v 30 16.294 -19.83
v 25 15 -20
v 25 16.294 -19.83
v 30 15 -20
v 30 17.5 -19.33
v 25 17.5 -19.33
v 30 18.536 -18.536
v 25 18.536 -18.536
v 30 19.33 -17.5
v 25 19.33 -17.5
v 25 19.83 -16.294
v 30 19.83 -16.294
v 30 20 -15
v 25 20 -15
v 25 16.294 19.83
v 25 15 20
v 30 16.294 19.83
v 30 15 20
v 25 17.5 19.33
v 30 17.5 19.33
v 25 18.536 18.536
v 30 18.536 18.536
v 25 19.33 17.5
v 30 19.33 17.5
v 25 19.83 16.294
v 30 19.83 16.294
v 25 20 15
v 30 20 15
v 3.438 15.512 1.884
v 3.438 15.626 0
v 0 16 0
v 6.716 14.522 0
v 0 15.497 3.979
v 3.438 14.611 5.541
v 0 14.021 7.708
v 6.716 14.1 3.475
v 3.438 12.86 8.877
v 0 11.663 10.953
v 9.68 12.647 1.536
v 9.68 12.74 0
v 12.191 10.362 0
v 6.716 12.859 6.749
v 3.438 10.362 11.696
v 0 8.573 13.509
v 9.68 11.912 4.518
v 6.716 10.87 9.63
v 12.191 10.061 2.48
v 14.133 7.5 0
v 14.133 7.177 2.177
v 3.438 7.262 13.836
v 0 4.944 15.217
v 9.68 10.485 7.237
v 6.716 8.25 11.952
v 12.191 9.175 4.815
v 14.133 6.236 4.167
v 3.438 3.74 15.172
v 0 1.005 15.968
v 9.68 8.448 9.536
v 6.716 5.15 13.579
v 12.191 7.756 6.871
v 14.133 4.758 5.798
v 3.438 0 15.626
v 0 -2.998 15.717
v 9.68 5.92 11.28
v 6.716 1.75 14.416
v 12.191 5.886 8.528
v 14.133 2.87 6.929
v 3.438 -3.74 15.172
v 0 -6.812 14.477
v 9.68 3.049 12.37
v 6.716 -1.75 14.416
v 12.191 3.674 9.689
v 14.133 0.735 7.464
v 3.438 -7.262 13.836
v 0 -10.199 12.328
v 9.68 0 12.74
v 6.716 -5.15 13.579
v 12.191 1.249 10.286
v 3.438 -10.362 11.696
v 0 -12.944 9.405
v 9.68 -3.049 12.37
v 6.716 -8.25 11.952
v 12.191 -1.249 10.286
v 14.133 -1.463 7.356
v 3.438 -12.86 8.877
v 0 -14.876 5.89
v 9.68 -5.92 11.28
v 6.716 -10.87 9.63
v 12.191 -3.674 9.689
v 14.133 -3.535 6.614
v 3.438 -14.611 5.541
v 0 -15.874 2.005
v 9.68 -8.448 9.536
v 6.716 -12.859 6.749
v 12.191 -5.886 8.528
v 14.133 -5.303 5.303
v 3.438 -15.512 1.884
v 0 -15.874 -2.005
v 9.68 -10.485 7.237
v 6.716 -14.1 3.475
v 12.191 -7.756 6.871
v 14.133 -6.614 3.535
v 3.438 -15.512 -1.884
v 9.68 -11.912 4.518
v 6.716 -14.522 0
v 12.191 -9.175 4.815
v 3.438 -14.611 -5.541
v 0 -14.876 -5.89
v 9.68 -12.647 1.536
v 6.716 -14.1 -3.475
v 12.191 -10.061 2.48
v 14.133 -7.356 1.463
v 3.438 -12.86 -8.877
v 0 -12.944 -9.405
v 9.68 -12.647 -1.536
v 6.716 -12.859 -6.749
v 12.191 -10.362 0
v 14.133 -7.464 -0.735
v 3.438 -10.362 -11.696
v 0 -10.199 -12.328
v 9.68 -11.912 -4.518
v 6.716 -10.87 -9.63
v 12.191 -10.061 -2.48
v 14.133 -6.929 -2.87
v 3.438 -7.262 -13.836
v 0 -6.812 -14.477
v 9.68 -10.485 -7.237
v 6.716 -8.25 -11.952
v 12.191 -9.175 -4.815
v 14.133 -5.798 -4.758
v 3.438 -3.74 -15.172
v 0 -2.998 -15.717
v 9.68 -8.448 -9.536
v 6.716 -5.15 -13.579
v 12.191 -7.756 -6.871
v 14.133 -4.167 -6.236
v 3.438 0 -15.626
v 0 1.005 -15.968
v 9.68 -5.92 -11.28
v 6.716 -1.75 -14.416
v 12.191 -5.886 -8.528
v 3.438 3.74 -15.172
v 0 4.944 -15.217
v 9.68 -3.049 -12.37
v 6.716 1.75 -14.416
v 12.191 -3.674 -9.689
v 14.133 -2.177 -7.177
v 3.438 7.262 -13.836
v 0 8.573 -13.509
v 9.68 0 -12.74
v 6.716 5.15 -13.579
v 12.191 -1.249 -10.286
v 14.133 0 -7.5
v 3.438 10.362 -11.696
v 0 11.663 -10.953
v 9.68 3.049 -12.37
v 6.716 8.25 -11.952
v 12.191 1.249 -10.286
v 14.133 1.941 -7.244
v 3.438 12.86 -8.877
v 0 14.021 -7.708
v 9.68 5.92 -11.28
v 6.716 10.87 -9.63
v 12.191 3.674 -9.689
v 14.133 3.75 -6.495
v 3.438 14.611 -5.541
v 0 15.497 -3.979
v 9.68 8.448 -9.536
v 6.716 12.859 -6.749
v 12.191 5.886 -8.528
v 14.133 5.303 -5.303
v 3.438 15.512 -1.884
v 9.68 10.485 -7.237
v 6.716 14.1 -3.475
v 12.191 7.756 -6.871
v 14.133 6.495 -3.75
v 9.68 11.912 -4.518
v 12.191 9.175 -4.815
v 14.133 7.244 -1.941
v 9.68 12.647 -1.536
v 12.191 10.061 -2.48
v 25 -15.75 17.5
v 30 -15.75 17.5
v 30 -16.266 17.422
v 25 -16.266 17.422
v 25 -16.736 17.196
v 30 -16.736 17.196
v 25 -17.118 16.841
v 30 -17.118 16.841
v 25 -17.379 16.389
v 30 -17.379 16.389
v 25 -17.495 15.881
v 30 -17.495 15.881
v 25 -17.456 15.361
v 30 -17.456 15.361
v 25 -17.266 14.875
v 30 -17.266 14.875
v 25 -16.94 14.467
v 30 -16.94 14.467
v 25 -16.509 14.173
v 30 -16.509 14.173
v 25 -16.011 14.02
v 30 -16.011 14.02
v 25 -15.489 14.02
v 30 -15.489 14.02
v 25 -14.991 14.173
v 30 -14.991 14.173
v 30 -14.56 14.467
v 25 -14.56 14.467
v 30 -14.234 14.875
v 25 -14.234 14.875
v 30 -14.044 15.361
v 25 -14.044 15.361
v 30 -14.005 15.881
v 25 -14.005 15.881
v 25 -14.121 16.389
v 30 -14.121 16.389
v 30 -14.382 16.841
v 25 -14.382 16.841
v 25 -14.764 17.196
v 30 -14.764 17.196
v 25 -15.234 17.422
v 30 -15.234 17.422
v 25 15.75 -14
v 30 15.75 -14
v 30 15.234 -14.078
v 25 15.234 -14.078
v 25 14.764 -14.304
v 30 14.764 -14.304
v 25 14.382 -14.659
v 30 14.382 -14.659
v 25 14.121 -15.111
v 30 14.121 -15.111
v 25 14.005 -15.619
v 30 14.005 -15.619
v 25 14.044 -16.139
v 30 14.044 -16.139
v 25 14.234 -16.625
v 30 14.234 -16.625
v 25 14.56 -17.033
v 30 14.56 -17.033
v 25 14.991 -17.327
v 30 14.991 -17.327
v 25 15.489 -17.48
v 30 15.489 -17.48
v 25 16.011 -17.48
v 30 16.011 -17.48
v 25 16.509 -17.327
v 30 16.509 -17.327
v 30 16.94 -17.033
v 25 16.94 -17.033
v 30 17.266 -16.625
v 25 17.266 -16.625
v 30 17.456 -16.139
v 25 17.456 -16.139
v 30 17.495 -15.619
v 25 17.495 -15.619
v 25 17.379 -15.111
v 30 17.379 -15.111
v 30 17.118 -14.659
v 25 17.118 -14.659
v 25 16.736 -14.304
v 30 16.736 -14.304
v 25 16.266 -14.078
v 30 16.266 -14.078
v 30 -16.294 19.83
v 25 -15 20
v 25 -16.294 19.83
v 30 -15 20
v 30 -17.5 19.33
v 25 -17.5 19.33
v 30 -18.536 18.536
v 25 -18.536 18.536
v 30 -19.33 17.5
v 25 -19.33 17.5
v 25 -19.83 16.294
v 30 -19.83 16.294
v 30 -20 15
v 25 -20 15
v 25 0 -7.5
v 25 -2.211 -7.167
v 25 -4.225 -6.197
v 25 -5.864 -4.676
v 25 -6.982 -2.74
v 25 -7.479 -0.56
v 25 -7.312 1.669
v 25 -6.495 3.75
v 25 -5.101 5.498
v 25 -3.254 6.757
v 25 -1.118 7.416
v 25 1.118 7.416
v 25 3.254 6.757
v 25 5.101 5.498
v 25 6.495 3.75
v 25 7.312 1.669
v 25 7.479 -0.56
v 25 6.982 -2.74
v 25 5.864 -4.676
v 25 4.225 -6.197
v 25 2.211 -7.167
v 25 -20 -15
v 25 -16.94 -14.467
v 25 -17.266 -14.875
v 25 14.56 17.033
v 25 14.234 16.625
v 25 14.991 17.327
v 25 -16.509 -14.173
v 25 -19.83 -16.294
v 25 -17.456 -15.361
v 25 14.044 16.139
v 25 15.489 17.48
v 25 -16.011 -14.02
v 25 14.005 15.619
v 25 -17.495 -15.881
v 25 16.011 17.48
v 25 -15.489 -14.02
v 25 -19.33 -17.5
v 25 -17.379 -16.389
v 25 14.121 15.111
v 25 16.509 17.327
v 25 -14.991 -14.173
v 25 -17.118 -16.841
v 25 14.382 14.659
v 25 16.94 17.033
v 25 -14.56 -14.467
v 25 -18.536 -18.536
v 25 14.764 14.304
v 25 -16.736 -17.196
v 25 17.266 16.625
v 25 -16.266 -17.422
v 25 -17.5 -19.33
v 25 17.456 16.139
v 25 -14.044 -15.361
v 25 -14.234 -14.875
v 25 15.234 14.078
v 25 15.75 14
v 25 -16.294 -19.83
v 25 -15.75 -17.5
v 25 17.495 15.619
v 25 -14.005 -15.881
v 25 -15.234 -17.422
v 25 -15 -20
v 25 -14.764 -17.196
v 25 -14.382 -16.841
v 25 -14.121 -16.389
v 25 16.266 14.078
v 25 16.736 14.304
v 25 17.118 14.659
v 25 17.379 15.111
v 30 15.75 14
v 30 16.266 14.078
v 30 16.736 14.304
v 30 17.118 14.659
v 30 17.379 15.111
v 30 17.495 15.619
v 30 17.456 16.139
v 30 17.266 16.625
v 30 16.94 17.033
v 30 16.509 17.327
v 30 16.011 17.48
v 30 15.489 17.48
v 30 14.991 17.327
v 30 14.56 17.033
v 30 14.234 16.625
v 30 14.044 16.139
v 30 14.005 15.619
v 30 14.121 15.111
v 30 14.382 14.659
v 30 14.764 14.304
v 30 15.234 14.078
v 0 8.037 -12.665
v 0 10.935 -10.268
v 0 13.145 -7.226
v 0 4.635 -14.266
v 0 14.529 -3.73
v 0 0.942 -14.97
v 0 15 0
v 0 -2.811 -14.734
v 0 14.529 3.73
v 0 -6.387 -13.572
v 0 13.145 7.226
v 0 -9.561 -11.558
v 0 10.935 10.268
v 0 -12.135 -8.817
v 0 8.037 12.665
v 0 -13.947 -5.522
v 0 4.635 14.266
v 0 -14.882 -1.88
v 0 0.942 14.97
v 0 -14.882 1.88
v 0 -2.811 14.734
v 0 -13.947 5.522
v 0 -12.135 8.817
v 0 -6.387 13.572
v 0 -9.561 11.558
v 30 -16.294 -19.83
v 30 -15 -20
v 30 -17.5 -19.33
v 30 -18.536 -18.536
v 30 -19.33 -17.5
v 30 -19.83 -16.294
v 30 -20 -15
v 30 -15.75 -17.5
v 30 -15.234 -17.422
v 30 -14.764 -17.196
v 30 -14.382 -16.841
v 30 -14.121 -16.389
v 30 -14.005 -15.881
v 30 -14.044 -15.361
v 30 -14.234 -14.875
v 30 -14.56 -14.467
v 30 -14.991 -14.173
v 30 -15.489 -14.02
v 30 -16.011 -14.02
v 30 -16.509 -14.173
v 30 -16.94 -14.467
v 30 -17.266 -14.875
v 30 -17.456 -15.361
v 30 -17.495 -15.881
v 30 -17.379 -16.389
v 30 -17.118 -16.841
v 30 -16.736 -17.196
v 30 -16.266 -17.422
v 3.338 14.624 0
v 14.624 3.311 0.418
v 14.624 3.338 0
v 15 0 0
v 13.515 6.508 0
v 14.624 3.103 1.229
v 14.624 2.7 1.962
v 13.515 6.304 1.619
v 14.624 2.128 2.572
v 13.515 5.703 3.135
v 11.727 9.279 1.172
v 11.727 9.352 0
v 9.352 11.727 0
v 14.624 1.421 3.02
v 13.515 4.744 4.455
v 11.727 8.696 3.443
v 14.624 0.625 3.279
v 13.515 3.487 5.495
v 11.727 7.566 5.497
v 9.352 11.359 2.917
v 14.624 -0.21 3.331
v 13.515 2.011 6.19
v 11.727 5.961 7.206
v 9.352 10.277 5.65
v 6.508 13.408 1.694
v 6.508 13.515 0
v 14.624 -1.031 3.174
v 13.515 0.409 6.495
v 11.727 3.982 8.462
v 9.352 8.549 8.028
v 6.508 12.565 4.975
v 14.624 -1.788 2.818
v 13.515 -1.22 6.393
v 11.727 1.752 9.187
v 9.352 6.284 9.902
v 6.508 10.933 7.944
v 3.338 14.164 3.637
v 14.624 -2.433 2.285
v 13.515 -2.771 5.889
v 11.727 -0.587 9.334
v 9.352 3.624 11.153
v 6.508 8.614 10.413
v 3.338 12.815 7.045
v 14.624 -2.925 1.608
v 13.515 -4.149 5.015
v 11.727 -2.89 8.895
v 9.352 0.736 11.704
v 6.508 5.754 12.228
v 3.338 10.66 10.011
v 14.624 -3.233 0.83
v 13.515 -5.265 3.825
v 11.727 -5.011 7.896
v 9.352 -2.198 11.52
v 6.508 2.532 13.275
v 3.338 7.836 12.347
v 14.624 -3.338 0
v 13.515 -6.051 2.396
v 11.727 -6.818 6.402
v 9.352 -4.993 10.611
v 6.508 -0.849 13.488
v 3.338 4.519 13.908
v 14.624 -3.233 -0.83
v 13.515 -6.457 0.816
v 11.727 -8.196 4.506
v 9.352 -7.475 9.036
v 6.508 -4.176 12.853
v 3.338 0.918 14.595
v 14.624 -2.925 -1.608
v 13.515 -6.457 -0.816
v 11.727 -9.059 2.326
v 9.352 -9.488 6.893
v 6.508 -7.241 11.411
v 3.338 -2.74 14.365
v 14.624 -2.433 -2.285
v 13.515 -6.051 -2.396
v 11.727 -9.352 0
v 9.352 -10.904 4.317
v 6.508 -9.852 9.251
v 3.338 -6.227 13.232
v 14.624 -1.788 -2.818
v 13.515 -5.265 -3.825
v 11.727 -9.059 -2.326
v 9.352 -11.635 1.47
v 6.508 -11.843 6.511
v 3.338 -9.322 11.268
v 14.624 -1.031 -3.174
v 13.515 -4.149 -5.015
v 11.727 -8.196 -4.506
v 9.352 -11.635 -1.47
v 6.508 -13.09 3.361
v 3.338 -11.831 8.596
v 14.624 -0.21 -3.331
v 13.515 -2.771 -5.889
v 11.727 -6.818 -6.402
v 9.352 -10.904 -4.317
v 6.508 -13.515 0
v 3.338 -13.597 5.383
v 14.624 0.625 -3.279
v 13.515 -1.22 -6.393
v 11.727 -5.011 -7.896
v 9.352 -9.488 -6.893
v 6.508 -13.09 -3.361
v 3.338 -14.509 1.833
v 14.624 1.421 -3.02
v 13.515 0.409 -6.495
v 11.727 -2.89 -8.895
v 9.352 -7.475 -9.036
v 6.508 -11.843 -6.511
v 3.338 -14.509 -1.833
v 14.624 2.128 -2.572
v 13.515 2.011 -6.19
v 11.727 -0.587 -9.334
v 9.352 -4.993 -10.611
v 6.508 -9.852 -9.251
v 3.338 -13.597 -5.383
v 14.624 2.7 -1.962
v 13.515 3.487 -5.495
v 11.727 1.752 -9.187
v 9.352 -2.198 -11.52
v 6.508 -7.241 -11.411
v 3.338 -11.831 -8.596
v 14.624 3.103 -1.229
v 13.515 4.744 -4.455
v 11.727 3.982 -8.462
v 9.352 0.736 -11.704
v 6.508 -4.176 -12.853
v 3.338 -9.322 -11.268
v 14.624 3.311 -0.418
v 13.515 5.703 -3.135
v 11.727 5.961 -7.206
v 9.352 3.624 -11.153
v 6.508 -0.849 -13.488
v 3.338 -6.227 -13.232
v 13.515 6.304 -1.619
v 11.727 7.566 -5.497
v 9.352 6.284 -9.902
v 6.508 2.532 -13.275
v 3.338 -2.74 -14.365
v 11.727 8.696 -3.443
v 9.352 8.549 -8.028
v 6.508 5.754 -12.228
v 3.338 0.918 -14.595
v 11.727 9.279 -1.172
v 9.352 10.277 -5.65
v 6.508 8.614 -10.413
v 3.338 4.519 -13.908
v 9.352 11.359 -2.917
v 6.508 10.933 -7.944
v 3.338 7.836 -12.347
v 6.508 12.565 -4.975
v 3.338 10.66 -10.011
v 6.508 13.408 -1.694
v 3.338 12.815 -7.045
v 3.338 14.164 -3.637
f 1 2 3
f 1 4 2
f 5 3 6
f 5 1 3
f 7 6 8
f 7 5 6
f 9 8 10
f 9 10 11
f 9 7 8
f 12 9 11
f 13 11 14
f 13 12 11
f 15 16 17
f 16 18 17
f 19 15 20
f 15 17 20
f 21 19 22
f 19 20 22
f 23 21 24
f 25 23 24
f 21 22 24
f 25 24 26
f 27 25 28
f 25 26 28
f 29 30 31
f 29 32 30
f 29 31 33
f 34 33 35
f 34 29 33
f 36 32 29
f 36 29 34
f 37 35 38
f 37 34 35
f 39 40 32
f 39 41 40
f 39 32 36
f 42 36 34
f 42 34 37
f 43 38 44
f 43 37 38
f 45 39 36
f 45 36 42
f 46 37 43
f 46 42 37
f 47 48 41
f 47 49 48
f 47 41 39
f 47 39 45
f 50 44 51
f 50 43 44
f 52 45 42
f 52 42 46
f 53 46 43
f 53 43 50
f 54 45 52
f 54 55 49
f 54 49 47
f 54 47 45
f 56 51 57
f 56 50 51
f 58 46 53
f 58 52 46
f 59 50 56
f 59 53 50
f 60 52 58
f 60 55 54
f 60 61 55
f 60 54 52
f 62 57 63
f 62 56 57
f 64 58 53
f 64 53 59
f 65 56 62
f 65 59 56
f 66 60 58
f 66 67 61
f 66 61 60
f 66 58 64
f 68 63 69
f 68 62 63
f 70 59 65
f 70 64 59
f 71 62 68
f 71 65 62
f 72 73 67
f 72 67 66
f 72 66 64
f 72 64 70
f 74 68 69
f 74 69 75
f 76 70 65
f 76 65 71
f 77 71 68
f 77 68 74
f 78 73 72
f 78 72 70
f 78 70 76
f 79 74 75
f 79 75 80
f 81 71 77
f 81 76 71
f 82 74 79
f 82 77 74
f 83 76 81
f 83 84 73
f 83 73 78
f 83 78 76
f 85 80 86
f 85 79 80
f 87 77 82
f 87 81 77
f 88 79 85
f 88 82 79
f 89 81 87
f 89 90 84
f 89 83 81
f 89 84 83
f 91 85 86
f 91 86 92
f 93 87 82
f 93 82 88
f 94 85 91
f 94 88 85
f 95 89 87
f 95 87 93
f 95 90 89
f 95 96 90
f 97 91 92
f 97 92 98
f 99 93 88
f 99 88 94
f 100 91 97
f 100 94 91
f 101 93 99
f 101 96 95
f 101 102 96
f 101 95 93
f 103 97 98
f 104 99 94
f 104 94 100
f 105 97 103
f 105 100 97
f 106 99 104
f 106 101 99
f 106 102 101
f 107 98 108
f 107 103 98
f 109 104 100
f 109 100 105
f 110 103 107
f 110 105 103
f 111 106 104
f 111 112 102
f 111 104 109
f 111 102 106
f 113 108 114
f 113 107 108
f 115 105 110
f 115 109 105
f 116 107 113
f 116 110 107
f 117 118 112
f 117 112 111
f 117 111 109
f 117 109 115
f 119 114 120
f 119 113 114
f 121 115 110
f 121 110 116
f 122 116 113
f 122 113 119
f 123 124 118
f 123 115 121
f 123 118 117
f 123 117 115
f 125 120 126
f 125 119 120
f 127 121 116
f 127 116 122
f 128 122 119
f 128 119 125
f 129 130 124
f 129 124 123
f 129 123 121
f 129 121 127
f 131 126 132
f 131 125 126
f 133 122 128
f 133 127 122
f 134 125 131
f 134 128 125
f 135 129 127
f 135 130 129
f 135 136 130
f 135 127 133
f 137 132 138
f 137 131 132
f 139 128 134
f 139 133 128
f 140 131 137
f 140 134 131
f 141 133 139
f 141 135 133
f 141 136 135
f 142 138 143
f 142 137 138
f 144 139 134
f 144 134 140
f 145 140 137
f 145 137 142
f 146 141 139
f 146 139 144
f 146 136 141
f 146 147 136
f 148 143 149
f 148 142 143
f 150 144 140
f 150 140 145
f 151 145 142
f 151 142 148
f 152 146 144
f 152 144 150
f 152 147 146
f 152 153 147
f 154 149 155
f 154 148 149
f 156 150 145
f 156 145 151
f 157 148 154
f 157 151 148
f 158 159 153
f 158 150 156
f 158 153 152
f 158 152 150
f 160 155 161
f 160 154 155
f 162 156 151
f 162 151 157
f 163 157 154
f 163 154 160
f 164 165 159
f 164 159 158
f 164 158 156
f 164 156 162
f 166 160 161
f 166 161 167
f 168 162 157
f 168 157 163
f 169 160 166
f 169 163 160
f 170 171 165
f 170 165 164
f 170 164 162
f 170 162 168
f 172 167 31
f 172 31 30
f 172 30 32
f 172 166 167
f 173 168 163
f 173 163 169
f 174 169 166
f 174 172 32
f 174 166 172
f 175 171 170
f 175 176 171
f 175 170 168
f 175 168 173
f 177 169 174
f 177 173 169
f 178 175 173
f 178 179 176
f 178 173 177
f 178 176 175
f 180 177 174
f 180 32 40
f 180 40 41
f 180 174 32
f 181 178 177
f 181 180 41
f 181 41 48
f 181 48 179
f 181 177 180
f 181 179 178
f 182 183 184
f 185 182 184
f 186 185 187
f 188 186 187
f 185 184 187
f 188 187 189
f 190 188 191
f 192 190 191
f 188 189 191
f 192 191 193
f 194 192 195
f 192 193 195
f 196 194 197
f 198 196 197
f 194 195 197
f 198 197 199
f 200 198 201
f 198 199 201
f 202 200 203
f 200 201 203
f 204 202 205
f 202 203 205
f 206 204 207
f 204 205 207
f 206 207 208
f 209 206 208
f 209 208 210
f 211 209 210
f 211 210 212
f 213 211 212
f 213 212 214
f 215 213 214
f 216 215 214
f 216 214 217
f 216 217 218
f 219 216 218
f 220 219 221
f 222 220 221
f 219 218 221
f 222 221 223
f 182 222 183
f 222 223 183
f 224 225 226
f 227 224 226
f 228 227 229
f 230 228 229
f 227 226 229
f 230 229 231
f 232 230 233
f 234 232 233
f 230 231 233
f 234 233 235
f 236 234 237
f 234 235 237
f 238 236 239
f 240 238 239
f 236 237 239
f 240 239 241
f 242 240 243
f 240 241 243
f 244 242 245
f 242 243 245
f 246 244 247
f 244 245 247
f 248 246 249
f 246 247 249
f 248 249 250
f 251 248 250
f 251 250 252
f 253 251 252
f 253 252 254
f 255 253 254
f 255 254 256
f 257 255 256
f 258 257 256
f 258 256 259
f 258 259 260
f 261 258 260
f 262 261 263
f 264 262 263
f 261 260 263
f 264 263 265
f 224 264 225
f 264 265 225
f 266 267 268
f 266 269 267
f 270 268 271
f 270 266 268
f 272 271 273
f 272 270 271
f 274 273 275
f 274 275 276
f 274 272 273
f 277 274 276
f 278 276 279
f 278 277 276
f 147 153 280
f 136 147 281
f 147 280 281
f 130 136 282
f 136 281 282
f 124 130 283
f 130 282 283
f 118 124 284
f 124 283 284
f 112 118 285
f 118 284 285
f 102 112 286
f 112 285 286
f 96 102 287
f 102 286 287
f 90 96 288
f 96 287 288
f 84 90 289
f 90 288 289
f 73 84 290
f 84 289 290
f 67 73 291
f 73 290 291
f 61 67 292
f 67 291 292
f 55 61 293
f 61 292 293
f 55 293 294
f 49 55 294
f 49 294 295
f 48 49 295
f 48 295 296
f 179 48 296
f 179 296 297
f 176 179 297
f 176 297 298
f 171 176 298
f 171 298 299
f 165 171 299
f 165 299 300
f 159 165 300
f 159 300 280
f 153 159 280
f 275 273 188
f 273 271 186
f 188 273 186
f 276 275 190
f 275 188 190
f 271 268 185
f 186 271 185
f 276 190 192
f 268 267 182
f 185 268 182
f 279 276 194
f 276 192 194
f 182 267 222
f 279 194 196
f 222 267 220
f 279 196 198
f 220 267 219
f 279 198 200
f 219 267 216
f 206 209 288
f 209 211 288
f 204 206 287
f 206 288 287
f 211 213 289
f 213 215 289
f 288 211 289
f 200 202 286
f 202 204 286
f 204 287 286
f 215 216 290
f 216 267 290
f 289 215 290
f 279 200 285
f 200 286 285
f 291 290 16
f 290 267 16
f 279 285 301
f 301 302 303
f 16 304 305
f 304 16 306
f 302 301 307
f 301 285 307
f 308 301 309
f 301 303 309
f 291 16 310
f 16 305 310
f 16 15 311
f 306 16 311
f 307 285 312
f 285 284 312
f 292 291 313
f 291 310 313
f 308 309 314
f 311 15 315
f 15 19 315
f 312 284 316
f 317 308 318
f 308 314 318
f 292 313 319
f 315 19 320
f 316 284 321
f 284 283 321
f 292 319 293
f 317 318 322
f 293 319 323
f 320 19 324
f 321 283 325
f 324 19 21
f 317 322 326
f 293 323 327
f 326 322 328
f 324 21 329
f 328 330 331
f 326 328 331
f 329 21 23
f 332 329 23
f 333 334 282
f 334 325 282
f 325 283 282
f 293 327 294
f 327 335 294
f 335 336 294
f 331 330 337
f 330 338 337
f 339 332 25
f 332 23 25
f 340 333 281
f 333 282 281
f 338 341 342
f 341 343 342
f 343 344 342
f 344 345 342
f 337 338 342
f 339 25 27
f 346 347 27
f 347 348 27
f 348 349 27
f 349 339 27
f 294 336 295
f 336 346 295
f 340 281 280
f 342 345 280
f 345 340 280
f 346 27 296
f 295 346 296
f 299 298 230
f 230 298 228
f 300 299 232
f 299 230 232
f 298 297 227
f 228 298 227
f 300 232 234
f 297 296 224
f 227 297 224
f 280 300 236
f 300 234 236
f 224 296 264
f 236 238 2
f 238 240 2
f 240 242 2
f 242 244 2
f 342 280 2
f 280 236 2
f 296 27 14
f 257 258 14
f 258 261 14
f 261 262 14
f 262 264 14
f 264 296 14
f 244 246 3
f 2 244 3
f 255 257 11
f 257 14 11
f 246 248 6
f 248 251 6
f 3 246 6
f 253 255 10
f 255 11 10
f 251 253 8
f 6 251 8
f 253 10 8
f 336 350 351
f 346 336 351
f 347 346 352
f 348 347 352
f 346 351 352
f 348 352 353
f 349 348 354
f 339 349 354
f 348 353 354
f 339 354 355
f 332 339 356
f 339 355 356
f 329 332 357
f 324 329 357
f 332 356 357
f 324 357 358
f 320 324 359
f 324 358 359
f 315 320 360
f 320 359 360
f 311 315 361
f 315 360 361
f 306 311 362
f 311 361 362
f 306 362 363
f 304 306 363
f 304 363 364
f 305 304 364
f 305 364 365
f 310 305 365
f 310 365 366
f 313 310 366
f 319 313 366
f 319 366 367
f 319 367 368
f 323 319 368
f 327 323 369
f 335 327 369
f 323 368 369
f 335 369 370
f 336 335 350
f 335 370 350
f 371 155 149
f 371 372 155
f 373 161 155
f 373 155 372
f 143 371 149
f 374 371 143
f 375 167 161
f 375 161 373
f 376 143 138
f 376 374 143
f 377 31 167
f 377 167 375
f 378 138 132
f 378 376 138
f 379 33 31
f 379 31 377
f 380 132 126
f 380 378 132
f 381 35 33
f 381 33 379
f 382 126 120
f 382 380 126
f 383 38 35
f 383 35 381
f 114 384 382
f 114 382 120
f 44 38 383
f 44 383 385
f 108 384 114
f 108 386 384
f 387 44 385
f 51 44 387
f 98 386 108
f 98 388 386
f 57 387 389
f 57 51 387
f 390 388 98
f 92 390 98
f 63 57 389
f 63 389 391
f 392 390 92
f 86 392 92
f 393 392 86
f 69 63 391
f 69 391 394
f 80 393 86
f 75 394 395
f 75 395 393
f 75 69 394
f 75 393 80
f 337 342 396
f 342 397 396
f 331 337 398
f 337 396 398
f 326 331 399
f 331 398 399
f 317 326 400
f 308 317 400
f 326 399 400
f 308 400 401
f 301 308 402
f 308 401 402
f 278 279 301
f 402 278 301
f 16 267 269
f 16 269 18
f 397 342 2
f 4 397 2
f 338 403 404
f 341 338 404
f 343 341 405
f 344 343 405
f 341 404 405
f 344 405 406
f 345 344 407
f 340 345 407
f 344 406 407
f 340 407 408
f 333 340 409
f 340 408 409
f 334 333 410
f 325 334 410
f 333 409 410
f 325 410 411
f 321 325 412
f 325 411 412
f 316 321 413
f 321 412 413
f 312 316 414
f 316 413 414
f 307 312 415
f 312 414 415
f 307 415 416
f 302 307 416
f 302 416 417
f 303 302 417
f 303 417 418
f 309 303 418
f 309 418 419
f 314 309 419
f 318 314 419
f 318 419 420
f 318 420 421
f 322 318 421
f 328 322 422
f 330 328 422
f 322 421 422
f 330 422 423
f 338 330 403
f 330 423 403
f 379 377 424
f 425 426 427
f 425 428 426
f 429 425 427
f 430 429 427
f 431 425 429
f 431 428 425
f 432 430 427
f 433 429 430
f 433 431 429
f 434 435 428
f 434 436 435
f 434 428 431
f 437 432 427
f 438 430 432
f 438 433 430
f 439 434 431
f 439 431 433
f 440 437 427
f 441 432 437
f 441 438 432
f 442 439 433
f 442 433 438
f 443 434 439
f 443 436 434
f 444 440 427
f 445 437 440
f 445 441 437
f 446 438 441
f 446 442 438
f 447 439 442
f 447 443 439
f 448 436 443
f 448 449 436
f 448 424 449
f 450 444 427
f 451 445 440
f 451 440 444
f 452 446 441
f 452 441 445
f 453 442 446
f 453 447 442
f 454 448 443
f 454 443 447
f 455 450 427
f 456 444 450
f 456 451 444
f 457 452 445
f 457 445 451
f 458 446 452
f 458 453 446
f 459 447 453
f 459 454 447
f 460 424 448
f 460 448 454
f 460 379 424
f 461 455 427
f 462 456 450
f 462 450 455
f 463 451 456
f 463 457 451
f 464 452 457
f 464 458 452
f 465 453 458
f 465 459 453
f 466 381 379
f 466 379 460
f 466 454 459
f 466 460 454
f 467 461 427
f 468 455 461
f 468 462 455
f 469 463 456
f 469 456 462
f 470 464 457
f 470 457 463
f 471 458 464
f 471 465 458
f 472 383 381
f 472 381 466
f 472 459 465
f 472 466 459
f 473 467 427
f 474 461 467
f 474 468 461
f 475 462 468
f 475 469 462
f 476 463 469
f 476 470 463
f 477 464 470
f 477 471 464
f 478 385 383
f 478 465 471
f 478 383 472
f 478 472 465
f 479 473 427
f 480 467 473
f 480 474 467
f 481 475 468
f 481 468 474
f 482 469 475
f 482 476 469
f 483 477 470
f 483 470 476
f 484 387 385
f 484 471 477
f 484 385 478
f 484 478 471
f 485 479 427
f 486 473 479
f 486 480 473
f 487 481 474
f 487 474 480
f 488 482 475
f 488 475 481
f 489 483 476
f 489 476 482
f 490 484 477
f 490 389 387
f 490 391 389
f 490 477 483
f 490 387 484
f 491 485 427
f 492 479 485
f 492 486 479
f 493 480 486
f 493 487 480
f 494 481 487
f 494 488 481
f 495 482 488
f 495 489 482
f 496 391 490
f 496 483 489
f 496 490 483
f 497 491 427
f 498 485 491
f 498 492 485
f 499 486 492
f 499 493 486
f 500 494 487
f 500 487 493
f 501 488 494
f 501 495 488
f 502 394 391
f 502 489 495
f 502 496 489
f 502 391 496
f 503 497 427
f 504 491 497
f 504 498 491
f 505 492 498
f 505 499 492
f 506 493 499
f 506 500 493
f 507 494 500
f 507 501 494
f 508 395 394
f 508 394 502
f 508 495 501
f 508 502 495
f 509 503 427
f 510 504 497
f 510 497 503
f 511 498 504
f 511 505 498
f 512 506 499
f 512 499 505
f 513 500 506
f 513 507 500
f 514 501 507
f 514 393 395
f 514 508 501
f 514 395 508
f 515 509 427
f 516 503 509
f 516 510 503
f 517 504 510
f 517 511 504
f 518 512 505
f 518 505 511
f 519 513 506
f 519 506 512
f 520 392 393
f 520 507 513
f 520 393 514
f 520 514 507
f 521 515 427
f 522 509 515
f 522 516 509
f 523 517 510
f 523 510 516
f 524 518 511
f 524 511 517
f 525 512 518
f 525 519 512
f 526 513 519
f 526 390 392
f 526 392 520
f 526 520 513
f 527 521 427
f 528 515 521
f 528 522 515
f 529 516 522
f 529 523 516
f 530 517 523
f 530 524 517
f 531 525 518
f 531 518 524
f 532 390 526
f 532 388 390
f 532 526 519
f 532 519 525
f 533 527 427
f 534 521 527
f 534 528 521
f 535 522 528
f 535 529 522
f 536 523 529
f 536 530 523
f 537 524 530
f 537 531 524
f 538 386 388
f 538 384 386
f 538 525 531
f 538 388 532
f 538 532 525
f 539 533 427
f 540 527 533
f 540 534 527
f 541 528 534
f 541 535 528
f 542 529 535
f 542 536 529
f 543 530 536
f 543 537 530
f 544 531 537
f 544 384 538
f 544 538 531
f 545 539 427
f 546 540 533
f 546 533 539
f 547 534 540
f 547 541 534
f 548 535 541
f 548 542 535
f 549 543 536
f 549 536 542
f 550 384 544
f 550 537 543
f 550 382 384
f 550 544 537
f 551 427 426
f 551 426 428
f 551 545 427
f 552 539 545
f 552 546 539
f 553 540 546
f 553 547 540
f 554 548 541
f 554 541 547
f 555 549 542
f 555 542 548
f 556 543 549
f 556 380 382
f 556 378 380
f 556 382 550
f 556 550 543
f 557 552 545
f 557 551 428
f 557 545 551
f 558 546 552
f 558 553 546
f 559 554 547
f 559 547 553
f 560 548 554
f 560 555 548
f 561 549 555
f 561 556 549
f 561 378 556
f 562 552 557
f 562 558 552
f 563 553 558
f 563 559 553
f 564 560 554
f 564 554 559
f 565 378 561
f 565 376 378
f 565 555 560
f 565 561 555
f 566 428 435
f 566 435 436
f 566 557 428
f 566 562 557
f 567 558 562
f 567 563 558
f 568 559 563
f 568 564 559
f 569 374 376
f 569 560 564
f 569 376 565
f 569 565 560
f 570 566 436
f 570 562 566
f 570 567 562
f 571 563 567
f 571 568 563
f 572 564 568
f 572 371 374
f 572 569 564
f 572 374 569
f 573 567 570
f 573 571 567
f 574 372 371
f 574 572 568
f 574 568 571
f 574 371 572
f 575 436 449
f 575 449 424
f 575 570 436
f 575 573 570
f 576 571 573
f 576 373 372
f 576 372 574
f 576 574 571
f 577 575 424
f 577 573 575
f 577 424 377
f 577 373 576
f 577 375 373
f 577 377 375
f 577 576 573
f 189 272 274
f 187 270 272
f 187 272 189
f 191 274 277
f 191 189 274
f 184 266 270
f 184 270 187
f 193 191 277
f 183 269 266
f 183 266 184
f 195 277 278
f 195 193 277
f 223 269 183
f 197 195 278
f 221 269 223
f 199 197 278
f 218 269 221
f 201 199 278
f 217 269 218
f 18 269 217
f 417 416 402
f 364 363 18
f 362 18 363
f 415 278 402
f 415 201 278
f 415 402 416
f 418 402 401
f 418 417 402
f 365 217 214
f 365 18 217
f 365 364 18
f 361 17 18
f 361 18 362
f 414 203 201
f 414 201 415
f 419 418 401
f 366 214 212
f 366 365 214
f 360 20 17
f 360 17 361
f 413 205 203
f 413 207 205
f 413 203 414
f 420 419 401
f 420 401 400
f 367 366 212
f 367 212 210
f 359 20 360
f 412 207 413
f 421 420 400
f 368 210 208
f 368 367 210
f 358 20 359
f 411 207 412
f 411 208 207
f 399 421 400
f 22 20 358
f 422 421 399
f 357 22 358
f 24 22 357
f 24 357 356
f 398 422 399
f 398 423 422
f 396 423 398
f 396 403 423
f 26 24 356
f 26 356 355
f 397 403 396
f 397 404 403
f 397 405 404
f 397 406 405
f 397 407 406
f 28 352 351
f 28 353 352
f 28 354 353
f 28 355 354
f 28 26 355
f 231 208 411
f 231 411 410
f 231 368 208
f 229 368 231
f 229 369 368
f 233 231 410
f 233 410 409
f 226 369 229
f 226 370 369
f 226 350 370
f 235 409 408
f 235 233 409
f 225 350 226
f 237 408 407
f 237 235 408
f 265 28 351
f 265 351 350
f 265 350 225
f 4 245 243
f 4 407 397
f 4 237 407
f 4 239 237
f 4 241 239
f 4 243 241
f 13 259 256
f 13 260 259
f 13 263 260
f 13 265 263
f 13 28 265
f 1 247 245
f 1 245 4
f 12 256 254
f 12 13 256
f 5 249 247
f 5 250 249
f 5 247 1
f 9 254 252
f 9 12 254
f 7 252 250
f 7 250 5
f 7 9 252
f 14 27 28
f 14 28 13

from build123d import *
from build123d.topology import SkipClean

# Parameters (mm, degrees)
SALIENTE_EXTRUIR1_REACH      = 54.713
SALIENTE_EXTRUIR1_END_RADIUS = 16
SALIENTE_EXTRUIR1_START      = -25
CROQUIS2_R                   = 7.5
CROQUIS3_W                   = 40
CROQUIS3_H                   = 40
SALIENTE_EXTRUIR2_DEPTH      = 5
REDONDEO1_R                  = 5
CROQUIS4_R                   = 1.75
CORTAR_EXTRUIR1_DEPTH        = 5


with BuildPart() as part:
    # Croquis1 → Revolución-Lámina1 (revolve)
    with BuildSketch(Plane.XY):
        with BuildLine():
            ThreePointArc((15, 0), (10.606601718, 10.606601718), (0, 15))
            Line((0, 15), (0, 16))
            ThreePointArc((0, 16), (11.313708499, 11.313708499), (16, 0))
            Line((16, 0), (15, 0))
        make_face()
    revolve(axis=Axis((0, 0, 0), (1, 0, 0)))

    # Saliente-Extruir1: up to this sphere (the profile starts outside it)
    with SkipClean():  # the faces are left unmerged after this step: merging them gives an invalid solid
        saliente_extruir1_end = Location((0, 0, 0)) * Sphere(SALIENTE_EXTRUIR1_END_RADIUS, mode=Mode.PRIVATE)
        # Croquis2 → Saliente-Extruir1 (add, up to the surface)
        with BuildSketch(Plane.ZY.offset(SALIENTE_EXTRUIR1_START), mode=Mode.PRIVATE) as saliente_extruir1_sk1:
            with Locations(Location((0, 0, 0), (0, 0, 180))):
                Circle(CROQUIS2_R)
        saliente_extruir1_tool1 = extrude(saliente_extruir1_sk1.sketch, amount=SALIENTE_EXTRUIR1_REACH, mode=Mode.PRIVATE) - saliente_extruir1_end
        add(saliente_extruir1_tool1.solids().sort_by_distance((25, 0, 0))[0])

    # Croquis3 → Saliente-Extruir2 (add)
    with BuildSketch(Plane(origin=(25, 0, 0), x_dir=(0, 0, -1), z_dir=(1, 0, 0))):
        Rectangle(CROQUIS3_W, CROQUIS3_H)
    extrude(amount=SALIENTE_EXTRUIR2_DEPTH)

    # Redondeo1
    redondeo1_edges = [part.edges().sort_by_distance(p)[0] for p in [
        (27.5, -20, -20),
        (27.5, 20, -20),
        (27.5, 20, 20),
        (27.5, -20, 20),
    ]]
    fillet(redondeo1_edges, radius=REDONDEO1_R)

    # Croquis4 → Cortar-Extruir1 (cut)
    with BuildSketch(Plane(origin=(30, 0, 0), x_dir=(0, 0, -1), z_dir=(1, 0, 0))):
        with Locations((-15.75, 15.75)):
            Circle(CROQUIS4_R)
        with Locations(Location((15.75, 15.75, 0), (0, 0, 180))):
            Circle(CROQUIS4_R)
        with Locations((15.75, -15.75)):
            Circle(CROQUIS4_R)
        with Locations(Location((-15.75, -15.75, 0), (0, 0, 180))):
            Circle(CROQUIS4_R)
    extrude(amount=-CORTAR_EXTRUIR1_DEPTH, mode=Mode.SUBTRACT)


solid = part.part
